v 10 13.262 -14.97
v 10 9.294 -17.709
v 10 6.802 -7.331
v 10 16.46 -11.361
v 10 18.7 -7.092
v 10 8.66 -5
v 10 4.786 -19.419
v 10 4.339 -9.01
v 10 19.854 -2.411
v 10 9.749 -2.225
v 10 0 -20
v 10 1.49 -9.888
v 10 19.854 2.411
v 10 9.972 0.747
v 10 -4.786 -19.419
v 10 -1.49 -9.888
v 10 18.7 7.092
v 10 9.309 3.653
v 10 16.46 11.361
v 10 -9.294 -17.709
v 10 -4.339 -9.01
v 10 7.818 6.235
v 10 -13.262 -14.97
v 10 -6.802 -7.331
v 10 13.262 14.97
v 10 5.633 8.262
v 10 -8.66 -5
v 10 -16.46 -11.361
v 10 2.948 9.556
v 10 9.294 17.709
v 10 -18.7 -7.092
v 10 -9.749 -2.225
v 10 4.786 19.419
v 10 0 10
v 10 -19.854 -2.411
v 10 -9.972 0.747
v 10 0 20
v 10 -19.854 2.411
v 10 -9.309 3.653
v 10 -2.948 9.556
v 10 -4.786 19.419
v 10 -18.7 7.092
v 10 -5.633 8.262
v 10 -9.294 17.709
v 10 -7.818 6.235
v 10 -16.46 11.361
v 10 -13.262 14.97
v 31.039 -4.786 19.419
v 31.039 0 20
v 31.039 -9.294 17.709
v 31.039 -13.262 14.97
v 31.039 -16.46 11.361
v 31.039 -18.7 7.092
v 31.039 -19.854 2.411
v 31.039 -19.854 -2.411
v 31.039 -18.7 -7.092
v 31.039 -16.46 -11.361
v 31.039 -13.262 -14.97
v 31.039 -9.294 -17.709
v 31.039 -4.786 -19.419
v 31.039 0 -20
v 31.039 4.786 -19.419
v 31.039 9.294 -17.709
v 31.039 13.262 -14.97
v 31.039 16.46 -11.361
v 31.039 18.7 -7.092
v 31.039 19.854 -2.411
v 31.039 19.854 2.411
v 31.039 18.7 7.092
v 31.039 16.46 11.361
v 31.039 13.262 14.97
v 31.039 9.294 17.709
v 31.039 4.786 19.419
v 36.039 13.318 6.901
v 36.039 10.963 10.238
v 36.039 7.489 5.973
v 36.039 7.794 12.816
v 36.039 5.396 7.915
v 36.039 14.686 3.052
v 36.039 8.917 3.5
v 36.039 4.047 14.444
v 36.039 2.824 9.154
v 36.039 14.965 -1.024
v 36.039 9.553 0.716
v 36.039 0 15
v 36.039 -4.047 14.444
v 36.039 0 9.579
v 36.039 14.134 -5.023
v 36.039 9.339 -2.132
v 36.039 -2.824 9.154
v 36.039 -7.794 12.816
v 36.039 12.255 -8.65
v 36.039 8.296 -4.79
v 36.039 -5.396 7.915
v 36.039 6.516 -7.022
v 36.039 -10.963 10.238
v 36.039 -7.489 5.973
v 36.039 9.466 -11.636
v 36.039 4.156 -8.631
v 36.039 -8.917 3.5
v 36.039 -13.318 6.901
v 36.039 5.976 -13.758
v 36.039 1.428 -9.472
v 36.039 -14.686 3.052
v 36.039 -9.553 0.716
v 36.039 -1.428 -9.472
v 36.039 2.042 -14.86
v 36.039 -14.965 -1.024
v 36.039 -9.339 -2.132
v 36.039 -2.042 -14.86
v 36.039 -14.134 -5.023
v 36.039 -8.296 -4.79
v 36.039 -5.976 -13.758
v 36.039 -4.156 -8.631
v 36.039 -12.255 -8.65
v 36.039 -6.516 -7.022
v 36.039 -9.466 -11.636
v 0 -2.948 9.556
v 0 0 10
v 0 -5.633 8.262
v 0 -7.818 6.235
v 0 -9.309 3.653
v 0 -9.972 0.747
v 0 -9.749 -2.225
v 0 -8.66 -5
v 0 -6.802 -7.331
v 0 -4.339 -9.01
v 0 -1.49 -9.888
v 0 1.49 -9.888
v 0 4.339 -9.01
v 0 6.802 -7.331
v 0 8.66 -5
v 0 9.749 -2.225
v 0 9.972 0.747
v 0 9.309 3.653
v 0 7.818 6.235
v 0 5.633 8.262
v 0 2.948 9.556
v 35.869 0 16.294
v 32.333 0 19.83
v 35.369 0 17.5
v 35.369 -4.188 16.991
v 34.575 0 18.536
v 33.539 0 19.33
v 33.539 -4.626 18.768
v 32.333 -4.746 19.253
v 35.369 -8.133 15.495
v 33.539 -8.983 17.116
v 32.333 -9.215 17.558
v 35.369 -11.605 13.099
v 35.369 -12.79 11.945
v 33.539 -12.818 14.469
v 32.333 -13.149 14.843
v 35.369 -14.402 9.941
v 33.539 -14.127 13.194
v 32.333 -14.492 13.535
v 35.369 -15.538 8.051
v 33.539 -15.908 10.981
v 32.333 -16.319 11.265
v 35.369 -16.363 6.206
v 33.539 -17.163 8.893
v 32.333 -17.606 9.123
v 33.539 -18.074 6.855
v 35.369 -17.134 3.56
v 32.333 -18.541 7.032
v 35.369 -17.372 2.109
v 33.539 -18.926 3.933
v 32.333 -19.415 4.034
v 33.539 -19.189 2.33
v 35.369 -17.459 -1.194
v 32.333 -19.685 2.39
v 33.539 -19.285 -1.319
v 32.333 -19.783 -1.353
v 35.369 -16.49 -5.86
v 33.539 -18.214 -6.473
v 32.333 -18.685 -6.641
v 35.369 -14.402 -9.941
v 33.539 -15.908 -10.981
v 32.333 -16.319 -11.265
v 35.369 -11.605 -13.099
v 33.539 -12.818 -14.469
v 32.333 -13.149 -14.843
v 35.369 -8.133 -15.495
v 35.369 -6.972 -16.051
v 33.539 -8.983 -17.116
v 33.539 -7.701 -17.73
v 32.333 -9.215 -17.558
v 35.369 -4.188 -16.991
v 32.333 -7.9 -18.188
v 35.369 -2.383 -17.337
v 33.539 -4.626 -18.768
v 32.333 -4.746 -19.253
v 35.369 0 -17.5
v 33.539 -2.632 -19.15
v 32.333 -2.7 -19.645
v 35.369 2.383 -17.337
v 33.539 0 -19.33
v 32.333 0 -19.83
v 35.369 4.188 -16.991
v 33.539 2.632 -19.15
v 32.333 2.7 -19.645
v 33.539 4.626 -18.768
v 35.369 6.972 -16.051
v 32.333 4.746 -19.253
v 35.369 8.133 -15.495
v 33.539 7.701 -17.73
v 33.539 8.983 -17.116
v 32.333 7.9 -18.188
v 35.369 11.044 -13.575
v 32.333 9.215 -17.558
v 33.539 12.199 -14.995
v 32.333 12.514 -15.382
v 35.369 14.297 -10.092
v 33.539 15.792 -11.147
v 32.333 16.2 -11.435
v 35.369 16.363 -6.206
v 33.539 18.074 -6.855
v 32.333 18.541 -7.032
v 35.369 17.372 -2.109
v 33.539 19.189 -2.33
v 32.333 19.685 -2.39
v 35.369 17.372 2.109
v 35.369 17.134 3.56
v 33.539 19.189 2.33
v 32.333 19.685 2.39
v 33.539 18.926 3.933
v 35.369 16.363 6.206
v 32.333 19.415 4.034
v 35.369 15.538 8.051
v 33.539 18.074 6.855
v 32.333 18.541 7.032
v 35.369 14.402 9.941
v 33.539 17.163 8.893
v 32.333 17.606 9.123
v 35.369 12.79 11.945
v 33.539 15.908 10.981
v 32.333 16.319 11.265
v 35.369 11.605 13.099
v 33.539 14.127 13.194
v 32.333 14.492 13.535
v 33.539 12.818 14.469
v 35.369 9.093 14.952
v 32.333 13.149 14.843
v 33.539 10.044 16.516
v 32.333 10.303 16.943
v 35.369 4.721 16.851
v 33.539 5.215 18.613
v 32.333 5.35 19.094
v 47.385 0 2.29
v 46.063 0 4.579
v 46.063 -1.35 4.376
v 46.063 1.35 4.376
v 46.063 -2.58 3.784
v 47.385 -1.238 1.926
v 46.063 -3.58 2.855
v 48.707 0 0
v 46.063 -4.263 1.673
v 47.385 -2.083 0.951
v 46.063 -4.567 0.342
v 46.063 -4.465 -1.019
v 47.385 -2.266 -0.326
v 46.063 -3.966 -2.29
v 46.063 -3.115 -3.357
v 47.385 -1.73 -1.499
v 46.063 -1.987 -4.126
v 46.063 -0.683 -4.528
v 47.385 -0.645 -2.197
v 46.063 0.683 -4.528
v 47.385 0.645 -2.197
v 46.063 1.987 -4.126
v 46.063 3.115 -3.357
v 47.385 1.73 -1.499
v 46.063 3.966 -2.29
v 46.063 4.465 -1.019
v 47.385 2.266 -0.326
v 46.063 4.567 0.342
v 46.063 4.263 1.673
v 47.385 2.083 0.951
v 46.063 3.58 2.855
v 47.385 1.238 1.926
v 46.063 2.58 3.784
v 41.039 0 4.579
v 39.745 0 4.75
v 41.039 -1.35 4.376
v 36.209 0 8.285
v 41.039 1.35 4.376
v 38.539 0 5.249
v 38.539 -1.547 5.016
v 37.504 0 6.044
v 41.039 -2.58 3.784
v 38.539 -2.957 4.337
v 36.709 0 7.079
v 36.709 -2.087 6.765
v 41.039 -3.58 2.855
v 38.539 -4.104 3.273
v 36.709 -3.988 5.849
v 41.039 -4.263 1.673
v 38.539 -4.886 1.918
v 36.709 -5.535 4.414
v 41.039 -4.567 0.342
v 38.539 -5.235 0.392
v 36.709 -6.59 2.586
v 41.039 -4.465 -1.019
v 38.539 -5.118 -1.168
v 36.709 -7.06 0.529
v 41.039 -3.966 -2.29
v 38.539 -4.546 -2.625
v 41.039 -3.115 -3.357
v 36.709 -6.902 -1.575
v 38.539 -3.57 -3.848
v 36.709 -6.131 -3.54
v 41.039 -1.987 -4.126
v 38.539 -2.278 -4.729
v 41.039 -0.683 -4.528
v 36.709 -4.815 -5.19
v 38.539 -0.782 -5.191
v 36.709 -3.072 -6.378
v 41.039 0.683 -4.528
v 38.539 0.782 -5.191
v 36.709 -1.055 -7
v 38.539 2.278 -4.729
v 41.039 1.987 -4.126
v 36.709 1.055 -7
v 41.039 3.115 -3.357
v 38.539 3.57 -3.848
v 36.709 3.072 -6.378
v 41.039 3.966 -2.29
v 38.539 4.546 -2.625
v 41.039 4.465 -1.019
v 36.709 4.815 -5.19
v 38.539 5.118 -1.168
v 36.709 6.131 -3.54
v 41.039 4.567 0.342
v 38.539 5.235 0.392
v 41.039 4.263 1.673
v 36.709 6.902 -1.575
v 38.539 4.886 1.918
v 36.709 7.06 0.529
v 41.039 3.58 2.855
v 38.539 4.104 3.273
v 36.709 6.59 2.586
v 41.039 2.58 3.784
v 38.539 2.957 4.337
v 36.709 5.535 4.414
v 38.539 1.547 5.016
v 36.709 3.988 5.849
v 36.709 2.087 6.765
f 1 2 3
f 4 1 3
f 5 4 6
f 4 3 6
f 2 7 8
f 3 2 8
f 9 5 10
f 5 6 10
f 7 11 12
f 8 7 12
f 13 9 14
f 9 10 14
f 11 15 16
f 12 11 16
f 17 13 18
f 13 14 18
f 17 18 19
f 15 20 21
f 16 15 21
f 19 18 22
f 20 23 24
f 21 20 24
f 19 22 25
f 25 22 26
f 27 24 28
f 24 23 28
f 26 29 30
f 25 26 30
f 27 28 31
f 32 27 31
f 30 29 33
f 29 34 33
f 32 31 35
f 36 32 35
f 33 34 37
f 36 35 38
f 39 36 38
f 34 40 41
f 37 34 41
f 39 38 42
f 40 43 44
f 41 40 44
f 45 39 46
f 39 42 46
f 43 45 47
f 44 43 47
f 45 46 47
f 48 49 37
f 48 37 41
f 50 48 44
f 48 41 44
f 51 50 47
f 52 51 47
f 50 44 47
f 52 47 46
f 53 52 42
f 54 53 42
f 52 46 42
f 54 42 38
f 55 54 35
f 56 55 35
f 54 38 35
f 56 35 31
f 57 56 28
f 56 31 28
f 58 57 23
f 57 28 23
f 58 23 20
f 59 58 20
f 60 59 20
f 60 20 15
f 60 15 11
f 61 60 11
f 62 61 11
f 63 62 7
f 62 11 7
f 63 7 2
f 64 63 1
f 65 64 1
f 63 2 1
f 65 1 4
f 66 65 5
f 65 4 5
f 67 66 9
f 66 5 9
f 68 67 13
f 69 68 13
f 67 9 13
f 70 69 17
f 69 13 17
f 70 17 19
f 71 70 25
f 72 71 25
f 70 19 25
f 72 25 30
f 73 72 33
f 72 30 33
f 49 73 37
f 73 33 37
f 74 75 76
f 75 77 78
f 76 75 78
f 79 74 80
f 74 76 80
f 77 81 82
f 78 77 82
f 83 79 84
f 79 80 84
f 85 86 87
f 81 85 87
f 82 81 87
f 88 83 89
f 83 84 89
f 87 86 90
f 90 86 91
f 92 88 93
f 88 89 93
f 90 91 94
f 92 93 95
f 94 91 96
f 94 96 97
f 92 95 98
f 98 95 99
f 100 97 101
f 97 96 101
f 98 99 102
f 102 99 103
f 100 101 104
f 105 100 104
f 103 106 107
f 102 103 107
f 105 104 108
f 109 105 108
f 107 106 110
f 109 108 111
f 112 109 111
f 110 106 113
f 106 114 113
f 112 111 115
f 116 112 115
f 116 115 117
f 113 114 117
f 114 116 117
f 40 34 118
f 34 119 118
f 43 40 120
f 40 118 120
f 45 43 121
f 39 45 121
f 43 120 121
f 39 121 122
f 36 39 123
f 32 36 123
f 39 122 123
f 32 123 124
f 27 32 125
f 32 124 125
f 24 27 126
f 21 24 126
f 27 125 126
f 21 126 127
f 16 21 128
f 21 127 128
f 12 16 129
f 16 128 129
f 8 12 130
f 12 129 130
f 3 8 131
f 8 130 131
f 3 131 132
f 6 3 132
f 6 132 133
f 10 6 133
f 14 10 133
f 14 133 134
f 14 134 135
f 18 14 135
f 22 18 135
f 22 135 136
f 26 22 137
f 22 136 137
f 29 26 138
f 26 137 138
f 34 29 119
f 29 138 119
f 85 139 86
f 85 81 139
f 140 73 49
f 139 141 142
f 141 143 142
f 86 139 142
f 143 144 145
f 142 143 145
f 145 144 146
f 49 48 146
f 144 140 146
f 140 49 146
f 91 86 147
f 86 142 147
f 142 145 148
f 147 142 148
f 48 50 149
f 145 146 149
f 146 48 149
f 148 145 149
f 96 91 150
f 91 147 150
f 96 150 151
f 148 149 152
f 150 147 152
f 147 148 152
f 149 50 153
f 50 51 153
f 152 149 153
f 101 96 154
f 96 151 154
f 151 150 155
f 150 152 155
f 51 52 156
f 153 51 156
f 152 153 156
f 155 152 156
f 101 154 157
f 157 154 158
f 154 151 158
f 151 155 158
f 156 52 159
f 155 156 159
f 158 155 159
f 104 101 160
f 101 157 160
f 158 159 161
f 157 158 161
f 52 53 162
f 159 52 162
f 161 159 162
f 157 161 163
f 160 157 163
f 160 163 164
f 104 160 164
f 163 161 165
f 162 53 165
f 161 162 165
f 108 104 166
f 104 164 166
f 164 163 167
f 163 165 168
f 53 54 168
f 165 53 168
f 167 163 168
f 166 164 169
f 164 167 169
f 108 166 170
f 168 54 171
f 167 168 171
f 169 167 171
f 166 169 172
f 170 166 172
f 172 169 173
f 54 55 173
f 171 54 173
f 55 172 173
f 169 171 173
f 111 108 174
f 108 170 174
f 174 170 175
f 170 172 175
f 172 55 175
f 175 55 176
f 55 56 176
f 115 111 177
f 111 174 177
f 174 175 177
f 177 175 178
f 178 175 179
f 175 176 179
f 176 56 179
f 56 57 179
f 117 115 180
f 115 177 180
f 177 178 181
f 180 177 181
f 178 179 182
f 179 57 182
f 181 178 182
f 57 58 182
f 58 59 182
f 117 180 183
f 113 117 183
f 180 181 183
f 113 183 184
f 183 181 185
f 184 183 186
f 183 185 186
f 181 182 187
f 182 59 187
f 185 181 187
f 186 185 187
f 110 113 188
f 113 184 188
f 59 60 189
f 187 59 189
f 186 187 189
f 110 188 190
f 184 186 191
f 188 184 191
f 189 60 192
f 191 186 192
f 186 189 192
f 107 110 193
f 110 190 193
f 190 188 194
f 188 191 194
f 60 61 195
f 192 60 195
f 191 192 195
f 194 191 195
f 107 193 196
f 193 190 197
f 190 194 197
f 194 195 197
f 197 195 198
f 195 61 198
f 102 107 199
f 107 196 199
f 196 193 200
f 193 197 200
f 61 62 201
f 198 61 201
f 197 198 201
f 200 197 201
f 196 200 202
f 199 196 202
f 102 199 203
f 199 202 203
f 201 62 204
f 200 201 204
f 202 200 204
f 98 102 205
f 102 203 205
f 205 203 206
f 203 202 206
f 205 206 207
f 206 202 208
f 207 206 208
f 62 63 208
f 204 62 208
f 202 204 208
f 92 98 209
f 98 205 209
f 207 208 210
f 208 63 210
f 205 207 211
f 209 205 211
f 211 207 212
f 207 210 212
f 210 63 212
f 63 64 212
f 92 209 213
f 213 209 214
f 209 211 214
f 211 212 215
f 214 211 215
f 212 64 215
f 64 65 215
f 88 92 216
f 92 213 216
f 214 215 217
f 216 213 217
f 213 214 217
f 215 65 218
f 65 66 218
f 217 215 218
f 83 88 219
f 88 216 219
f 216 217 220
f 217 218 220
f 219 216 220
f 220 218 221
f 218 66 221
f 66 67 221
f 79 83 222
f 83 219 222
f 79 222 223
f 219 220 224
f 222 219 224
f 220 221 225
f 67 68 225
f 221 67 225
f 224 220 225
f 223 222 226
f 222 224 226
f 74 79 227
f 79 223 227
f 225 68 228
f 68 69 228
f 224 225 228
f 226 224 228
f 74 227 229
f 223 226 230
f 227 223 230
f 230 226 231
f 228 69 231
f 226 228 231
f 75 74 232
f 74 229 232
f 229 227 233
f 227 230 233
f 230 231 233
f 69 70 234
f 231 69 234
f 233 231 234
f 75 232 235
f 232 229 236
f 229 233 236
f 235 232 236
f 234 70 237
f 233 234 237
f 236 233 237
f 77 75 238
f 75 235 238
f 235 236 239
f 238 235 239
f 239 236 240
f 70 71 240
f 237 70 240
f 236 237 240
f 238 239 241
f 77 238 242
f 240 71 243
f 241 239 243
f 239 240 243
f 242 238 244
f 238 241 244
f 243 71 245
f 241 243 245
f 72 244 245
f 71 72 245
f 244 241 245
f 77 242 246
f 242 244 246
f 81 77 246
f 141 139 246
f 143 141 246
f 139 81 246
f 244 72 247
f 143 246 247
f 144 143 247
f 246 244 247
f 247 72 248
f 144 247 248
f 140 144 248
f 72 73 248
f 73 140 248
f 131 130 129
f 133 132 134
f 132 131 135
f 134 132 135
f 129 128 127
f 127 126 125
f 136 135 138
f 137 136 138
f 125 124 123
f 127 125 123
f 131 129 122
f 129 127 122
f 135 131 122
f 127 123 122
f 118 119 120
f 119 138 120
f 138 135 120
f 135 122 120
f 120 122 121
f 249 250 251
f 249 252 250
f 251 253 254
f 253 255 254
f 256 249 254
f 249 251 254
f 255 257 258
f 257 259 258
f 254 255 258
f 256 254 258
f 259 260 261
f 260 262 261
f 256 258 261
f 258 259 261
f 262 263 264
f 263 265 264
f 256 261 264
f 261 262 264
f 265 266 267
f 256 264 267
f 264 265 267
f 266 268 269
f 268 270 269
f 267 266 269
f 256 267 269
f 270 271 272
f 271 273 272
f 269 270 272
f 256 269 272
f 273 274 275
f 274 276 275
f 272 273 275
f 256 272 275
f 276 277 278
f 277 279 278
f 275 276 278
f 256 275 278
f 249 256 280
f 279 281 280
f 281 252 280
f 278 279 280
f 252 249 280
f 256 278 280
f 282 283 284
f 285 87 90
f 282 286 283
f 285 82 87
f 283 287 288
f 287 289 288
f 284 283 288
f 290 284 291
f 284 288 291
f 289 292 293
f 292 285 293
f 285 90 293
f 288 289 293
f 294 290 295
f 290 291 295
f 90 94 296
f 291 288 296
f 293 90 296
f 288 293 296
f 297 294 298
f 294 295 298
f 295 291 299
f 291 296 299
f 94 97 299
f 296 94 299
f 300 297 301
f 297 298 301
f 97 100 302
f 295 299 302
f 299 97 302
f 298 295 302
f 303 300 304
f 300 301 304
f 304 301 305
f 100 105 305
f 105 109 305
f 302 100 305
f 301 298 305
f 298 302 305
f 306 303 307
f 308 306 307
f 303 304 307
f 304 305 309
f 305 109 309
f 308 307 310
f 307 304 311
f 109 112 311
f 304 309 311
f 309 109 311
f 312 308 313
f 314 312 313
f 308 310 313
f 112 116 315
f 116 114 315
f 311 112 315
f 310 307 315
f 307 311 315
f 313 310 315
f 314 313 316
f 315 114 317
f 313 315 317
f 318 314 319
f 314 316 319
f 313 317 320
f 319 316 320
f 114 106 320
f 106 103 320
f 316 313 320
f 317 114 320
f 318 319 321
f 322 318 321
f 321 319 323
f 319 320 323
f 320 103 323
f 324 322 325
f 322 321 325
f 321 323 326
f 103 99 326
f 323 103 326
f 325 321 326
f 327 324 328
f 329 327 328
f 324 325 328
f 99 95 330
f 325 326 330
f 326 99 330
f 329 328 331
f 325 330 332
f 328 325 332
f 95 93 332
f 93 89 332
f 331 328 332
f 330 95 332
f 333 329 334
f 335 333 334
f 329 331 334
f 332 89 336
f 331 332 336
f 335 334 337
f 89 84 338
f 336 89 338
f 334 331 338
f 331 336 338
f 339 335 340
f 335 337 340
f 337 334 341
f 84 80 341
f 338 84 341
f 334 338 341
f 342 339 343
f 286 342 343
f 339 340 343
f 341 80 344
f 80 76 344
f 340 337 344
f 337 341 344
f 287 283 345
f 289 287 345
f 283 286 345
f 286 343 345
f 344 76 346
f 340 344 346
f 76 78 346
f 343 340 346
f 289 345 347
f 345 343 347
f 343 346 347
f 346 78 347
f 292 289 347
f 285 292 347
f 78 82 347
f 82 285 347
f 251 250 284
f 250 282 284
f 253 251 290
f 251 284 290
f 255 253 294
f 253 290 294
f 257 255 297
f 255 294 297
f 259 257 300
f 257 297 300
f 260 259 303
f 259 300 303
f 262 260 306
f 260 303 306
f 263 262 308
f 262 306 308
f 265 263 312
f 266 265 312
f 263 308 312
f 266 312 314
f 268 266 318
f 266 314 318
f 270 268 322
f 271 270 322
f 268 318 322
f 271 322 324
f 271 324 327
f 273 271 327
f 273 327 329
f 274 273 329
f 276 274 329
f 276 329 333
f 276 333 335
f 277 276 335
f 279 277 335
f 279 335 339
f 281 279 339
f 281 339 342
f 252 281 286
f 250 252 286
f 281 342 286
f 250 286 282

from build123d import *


with BuildPart() as part:
    # Esquisse1 → Révolution1 (revolve)
    with BuildSketch(Plane.XY, mode=Mode.PRIVATE) as r_volution1_sk:
        with BuildLine():
            Line((0, 0), (48.706777749, 0))
            Line((48.706777749, 0), (46.062888871, 4.579349866))
            Line((46.062888871, 4.579349866), (41.039040874, 4.579349866))
            ThreePointArc((41.039040874, 4.579349866), (37.503506968, 6.04381596), (36.039040874, 9.579349866))
            Line((36.039040874, 9.579349866), (36.039040874, 15))
            ThreePointArc((36.039040874, 15), (34.57457478, 18.535533906), (31.039040874, 20))
            Line((31.039040874, 20), (10, 20))
            Line((10, 20), (10, 10))
            Line((10, 10), (0, 10))
            Line((0, 10), (0, 0))
        make_face()
    revolve(r_volution1_sk.sketch.rotate(Axis((0, 0, 0), (1, 0, 0)), 90), axis=Axis((0, 0, 0), (1, 0, 0)))


solid = part.part
